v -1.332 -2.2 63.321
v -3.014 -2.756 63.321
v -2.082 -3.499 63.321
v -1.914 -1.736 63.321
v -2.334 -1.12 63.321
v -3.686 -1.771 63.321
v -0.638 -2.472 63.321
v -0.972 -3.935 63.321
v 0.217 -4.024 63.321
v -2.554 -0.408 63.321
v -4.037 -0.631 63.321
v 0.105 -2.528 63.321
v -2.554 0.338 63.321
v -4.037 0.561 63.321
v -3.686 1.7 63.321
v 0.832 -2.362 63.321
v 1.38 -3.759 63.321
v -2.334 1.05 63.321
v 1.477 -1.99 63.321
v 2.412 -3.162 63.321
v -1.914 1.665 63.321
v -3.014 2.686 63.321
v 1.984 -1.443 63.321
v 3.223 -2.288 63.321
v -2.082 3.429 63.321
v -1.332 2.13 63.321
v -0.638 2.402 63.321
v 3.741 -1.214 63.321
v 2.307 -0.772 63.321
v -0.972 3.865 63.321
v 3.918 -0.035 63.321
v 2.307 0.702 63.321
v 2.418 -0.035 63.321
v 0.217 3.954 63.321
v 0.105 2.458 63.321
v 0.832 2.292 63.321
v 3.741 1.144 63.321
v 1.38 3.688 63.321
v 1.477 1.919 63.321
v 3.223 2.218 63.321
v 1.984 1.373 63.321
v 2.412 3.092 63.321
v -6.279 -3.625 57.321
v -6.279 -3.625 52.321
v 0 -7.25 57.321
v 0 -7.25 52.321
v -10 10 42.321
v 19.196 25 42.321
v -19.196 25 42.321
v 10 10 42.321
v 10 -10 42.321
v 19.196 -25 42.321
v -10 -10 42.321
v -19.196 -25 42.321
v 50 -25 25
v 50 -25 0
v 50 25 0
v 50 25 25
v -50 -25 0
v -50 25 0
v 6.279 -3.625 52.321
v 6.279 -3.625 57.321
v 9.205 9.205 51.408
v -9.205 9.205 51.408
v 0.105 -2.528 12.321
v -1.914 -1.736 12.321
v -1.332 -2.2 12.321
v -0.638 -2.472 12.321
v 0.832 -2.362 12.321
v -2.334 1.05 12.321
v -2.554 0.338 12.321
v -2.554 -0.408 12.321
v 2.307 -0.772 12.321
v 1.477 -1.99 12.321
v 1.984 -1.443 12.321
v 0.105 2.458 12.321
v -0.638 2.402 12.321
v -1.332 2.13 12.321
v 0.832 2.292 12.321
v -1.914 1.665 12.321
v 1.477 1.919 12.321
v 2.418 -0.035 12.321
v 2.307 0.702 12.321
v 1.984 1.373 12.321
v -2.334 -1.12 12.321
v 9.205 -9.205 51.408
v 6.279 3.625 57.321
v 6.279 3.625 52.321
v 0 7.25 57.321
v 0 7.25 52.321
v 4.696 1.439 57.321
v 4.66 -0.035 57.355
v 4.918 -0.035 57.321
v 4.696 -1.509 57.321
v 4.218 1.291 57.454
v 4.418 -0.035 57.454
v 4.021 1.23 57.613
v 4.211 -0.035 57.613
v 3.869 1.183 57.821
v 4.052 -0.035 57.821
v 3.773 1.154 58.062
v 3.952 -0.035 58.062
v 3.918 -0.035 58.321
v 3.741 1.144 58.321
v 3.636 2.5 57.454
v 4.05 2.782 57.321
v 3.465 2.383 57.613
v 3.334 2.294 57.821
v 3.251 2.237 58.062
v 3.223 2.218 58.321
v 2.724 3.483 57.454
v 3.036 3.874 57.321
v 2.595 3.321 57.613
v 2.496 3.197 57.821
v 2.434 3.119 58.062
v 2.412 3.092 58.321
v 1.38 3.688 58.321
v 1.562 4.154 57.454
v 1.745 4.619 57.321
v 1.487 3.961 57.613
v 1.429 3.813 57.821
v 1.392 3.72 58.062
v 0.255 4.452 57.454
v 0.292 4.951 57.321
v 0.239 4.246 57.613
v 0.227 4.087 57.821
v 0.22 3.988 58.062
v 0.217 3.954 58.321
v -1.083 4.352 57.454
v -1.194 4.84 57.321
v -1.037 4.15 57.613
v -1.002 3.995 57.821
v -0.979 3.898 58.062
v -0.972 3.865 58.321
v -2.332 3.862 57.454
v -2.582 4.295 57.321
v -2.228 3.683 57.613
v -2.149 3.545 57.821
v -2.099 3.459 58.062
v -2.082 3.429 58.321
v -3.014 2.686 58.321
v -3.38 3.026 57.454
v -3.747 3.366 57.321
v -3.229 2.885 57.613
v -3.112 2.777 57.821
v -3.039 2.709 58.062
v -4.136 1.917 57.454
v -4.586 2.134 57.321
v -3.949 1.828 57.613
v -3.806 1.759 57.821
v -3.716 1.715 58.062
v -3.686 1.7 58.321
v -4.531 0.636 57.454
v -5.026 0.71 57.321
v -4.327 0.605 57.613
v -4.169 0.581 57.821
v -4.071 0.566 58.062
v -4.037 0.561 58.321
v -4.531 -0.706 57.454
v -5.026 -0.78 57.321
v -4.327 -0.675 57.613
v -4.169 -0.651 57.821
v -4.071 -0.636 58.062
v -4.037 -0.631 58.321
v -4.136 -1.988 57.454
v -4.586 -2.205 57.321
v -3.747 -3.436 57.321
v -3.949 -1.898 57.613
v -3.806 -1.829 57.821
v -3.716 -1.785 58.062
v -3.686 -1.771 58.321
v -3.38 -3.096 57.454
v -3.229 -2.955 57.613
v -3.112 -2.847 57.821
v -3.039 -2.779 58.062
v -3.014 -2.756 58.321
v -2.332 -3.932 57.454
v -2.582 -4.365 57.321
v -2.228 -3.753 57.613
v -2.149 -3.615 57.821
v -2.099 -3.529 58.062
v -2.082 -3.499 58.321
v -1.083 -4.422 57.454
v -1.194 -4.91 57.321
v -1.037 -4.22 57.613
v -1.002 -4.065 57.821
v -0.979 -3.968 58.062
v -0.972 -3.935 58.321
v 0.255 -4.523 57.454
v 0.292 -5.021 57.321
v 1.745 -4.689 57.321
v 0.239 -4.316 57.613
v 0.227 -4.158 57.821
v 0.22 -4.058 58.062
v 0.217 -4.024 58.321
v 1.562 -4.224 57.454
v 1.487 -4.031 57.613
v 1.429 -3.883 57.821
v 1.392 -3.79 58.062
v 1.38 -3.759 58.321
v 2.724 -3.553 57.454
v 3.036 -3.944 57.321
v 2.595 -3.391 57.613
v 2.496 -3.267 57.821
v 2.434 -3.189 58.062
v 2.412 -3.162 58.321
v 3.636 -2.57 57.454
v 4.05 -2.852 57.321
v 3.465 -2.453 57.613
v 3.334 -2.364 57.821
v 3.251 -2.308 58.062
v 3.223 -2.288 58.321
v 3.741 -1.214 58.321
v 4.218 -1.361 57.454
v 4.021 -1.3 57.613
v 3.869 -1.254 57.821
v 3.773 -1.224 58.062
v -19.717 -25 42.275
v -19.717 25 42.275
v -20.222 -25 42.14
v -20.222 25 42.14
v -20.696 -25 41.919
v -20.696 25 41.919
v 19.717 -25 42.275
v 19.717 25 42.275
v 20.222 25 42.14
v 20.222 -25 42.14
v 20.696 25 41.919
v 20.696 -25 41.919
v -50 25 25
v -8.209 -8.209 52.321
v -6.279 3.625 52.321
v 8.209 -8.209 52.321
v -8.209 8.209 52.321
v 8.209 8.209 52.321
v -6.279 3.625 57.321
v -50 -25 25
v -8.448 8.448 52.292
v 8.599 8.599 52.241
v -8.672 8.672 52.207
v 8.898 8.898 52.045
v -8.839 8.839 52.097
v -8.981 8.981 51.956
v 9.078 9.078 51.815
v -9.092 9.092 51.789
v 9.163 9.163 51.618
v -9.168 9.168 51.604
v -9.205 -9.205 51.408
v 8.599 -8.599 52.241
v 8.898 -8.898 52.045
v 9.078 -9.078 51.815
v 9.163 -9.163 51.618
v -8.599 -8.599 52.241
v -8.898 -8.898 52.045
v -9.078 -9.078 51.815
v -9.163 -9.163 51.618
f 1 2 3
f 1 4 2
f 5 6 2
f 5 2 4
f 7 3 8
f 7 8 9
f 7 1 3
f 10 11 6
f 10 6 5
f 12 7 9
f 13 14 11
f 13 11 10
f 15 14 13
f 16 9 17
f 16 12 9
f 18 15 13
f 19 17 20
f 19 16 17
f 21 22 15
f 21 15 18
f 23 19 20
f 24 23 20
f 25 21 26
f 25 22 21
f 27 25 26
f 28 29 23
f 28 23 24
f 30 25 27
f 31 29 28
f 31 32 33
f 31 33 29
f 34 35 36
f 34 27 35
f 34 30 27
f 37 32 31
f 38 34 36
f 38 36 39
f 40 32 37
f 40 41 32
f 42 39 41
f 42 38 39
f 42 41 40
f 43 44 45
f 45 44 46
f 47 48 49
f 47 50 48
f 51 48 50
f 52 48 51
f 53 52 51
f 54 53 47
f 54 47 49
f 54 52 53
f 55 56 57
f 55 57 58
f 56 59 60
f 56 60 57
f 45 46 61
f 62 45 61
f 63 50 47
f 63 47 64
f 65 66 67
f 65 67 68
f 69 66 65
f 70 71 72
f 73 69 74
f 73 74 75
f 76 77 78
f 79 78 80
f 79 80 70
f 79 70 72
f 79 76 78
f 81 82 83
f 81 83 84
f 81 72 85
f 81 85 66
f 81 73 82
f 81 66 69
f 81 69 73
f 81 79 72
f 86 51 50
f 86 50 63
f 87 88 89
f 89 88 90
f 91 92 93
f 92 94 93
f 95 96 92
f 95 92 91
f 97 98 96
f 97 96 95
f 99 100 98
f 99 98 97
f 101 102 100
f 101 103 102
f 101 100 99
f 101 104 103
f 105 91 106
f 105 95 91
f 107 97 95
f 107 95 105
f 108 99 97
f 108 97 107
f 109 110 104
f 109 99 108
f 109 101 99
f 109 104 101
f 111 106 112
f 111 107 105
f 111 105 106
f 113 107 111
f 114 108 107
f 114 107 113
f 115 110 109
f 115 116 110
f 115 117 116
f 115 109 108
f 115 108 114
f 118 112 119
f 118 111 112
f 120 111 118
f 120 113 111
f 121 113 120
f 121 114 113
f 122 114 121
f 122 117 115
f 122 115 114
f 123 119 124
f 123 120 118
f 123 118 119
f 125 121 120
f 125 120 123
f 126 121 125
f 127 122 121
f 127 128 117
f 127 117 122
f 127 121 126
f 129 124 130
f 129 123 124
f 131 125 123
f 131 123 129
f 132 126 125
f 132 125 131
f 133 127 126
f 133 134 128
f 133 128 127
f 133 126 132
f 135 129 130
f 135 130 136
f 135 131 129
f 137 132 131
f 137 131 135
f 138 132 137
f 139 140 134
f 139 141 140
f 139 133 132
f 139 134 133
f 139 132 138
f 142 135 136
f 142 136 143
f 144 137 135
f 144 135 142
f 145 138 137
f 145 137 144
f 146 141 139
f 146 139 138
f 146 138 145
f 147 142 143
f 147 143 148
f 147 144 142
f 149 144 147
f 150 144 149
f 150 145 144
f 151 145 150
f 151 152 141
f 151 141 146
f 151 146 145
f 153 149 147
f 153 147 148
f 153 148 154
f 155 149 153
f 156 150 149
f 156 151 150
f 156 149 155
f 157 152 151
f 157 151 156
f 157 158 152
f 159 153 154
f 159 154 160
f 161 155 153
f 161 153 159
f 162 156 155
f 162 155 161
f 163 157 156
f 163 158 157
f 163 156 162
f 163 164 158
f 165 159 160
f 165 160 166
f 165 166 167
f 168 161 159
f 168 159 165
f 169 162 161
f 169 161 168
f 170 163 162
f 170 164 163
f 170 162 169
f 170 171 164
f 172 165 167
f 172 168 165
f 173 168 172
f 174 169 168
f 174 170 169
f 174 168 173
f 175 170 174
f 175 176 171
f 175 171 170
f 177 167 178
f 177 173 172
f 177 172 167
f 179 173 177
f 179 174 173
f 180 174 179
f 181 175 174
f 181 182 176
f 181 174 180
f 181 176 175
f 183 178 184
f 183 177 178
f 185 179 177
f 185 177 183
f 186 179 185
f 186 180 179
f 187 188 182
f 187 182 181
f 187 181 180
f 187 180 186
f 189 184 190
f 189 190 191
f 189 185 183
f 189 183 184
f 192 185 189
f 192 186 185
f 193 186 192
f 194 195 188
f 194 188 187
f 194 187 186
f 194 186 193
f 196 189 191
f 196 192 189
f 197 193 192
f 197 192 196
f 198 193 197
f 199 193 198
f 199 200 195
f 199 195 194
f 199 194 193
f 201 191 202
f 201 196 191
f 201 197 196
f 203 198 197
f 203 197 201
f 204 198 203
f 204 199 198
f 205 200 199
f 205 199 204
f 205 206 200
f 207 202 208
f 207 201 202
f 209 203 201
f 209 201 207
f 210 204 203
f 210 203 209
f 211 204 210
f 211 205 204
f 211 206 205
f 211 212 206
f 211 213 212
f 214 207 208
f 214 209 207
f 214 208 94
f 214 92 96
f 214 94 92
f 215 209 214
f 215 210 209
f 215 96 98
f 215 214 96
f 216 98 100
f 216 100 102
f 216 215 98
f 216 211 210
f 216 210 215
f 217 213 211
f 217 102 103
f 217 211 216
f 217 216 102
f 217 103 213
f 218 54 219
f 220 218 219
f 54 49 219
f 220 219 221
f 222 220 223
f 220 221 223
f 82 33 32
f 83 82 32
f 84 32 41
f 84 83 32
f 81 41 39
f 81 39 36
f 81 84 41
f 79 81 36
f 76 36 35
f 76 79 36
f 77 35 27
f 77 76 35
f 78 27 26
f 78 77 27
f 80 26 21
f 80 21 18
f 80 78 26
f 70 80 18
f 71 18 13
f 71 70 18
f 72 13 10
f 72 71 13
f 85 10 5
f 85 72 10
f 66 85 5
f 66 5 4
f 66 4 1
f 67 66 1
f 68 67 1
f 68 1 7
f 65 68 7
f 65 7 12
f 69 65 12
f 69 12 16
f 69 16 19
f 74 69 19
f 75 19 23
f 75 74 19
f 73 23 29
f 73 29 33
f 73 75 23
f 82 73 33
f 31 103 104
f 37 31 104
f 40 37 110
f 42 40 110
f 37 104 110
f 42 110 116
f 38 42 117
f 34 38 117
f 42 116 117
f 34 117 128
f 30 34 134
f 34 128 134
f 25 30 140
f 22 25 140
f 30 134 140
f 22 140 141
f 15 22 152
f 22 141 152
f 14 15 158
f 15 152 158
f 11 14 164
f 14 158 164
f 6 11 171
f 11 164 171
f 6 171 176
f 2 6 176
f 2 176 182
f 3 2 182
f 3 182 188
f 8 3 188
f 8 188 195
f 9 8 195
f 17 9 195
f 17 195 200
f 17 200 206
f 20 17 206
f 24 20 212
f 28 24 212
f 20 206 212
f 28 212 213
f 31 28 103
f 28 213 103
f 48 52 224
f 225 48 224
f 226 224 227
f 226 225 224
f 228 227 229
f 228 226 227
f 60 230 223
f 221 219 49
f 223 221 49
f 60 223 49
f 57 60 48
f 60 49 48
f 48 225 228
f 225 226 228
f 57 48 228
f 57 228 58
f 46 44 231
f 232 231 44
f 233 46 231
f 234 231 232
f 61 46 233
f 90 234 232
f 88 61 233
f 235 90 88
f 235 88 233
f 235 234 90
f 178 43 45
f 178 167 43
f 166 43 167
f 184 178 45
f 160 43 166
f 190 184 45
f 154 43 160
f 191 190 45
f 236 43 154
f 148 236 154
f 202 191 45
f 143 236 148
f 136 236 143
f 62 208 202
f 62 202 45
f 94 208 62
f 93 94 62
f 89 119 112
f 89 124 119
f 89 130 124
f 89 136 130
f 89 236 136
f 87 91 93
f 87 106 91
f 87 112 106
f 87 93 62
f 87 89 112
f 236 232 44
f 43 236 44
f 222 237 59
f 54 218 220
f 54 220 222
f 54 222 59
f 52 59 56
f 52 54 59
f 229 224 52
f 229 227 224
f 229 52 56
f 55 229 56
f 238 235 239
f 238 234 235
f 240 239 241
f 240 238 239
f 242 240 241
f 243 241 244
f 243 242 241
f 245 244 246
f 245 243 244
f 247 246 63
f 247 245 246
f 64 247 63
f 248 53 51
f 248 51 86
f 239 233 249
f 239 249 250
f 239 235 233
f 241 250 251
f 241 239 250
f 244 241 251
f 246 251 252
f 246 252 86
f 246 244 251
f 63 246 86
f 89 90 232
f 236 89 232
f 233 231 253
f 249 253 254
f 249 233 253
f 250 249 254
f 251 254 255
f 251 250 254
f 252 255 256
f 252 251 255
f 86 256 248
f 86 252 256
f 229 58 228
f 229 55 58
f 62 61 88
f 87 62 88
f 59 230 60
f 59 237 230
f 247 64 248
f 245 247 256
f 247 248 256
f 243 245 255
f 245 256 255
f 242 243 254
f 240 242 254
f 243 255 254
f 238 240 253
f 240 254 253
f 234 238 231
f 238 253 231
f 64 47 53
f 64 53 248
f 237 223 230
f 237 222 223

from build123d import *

# Parameters (mm, degrees)
F1_DEPTH = 25
F2_W     = 20
F2_H     = 20
F3_DEPTH = 10
F3_TAPER = 5
F5_DEPTH = 5
F6_R     = 4
F6_R_2   = 2.5
F7_DEPTH = 6
F8_DEPTH = 45
F9_R     = 1
F10_R    = 3


with BuildPart() as f1:
    # F0 (on Front) → F1 (new body, symmetric)
    with BuildSketch(Plane.XZ):
        Polygon((-50, 25), (-50, 0), (50, 0), (50, 25), (20, 42.3205080757), (-20, 42.3205080757), align=None)
    extrude(amount=F1_DEPTH, both=True)

    # F2 (on face) → F3 (join)
    with BuildSketch(Plane.XY.offset(42.3205080757)):
        Rectangle(F2_W, F2_H)
    extrude(amount=F3_DEPTH, taper=F3_TAPER)

    # F4 (on face) → F5 (join)
    with BuildSketch(Plane.XY.offset(52.3205080757)):
        Polygon((-6.2786841774, -3.625), (0, -7.25), (6.2786841774, -3.625), (6.2786841774, 3.625), (0, 7.25), (-6.2786841774, 3.625), align=None)
    extrude(amount=F5_DEPTH)

    # F6 (on face) → F7 (join)
    with BuildSketch(Plane.XY.offset(57.3205080757)):
        with Locations((-0.0816522495, -0.0350918563)):
            Circle(F6_R)
        with Locations((-0.0816522495, -0.0350918563)):
            Circle(F6_R_2, mode=Mode.SUBTRACT)
    extrude(amount=F7_DEPTH)

    # F8 (cut): a face of the model
    f8_faces = [f1.faces().sort_by_distance(p)[0] for p in [
        (-0.0816522495, -0.0350918563, 57.3205080757),
    ]]
    extrude(f8_faces, amount=-F8_DEPTH, mode=Mode.SUBTRACT)

    # F9
    f9_edges = [f1.edges().sort_by_distance(p)[0] for p in [
        (0, -9.125113, 52.320508),
        (-9.125113, 0, 52.320508),
        (9.125113, 0, 52.320508),
        (0, 9.125113, 52.320508),
        (-4.081652, -0.035092, 57.320508),
    ]]
    fillet(f9_edges, radius=F9_R)

    # F10
    f10_edges = [f1.edges().sort_by_distance(p)[0] for p in [
        (-20, 0, 42.320508),
        (20, 0, 42.320508),
    ]]
    fillet(f10_edges, radius=F10_R)


solid = f1.part
